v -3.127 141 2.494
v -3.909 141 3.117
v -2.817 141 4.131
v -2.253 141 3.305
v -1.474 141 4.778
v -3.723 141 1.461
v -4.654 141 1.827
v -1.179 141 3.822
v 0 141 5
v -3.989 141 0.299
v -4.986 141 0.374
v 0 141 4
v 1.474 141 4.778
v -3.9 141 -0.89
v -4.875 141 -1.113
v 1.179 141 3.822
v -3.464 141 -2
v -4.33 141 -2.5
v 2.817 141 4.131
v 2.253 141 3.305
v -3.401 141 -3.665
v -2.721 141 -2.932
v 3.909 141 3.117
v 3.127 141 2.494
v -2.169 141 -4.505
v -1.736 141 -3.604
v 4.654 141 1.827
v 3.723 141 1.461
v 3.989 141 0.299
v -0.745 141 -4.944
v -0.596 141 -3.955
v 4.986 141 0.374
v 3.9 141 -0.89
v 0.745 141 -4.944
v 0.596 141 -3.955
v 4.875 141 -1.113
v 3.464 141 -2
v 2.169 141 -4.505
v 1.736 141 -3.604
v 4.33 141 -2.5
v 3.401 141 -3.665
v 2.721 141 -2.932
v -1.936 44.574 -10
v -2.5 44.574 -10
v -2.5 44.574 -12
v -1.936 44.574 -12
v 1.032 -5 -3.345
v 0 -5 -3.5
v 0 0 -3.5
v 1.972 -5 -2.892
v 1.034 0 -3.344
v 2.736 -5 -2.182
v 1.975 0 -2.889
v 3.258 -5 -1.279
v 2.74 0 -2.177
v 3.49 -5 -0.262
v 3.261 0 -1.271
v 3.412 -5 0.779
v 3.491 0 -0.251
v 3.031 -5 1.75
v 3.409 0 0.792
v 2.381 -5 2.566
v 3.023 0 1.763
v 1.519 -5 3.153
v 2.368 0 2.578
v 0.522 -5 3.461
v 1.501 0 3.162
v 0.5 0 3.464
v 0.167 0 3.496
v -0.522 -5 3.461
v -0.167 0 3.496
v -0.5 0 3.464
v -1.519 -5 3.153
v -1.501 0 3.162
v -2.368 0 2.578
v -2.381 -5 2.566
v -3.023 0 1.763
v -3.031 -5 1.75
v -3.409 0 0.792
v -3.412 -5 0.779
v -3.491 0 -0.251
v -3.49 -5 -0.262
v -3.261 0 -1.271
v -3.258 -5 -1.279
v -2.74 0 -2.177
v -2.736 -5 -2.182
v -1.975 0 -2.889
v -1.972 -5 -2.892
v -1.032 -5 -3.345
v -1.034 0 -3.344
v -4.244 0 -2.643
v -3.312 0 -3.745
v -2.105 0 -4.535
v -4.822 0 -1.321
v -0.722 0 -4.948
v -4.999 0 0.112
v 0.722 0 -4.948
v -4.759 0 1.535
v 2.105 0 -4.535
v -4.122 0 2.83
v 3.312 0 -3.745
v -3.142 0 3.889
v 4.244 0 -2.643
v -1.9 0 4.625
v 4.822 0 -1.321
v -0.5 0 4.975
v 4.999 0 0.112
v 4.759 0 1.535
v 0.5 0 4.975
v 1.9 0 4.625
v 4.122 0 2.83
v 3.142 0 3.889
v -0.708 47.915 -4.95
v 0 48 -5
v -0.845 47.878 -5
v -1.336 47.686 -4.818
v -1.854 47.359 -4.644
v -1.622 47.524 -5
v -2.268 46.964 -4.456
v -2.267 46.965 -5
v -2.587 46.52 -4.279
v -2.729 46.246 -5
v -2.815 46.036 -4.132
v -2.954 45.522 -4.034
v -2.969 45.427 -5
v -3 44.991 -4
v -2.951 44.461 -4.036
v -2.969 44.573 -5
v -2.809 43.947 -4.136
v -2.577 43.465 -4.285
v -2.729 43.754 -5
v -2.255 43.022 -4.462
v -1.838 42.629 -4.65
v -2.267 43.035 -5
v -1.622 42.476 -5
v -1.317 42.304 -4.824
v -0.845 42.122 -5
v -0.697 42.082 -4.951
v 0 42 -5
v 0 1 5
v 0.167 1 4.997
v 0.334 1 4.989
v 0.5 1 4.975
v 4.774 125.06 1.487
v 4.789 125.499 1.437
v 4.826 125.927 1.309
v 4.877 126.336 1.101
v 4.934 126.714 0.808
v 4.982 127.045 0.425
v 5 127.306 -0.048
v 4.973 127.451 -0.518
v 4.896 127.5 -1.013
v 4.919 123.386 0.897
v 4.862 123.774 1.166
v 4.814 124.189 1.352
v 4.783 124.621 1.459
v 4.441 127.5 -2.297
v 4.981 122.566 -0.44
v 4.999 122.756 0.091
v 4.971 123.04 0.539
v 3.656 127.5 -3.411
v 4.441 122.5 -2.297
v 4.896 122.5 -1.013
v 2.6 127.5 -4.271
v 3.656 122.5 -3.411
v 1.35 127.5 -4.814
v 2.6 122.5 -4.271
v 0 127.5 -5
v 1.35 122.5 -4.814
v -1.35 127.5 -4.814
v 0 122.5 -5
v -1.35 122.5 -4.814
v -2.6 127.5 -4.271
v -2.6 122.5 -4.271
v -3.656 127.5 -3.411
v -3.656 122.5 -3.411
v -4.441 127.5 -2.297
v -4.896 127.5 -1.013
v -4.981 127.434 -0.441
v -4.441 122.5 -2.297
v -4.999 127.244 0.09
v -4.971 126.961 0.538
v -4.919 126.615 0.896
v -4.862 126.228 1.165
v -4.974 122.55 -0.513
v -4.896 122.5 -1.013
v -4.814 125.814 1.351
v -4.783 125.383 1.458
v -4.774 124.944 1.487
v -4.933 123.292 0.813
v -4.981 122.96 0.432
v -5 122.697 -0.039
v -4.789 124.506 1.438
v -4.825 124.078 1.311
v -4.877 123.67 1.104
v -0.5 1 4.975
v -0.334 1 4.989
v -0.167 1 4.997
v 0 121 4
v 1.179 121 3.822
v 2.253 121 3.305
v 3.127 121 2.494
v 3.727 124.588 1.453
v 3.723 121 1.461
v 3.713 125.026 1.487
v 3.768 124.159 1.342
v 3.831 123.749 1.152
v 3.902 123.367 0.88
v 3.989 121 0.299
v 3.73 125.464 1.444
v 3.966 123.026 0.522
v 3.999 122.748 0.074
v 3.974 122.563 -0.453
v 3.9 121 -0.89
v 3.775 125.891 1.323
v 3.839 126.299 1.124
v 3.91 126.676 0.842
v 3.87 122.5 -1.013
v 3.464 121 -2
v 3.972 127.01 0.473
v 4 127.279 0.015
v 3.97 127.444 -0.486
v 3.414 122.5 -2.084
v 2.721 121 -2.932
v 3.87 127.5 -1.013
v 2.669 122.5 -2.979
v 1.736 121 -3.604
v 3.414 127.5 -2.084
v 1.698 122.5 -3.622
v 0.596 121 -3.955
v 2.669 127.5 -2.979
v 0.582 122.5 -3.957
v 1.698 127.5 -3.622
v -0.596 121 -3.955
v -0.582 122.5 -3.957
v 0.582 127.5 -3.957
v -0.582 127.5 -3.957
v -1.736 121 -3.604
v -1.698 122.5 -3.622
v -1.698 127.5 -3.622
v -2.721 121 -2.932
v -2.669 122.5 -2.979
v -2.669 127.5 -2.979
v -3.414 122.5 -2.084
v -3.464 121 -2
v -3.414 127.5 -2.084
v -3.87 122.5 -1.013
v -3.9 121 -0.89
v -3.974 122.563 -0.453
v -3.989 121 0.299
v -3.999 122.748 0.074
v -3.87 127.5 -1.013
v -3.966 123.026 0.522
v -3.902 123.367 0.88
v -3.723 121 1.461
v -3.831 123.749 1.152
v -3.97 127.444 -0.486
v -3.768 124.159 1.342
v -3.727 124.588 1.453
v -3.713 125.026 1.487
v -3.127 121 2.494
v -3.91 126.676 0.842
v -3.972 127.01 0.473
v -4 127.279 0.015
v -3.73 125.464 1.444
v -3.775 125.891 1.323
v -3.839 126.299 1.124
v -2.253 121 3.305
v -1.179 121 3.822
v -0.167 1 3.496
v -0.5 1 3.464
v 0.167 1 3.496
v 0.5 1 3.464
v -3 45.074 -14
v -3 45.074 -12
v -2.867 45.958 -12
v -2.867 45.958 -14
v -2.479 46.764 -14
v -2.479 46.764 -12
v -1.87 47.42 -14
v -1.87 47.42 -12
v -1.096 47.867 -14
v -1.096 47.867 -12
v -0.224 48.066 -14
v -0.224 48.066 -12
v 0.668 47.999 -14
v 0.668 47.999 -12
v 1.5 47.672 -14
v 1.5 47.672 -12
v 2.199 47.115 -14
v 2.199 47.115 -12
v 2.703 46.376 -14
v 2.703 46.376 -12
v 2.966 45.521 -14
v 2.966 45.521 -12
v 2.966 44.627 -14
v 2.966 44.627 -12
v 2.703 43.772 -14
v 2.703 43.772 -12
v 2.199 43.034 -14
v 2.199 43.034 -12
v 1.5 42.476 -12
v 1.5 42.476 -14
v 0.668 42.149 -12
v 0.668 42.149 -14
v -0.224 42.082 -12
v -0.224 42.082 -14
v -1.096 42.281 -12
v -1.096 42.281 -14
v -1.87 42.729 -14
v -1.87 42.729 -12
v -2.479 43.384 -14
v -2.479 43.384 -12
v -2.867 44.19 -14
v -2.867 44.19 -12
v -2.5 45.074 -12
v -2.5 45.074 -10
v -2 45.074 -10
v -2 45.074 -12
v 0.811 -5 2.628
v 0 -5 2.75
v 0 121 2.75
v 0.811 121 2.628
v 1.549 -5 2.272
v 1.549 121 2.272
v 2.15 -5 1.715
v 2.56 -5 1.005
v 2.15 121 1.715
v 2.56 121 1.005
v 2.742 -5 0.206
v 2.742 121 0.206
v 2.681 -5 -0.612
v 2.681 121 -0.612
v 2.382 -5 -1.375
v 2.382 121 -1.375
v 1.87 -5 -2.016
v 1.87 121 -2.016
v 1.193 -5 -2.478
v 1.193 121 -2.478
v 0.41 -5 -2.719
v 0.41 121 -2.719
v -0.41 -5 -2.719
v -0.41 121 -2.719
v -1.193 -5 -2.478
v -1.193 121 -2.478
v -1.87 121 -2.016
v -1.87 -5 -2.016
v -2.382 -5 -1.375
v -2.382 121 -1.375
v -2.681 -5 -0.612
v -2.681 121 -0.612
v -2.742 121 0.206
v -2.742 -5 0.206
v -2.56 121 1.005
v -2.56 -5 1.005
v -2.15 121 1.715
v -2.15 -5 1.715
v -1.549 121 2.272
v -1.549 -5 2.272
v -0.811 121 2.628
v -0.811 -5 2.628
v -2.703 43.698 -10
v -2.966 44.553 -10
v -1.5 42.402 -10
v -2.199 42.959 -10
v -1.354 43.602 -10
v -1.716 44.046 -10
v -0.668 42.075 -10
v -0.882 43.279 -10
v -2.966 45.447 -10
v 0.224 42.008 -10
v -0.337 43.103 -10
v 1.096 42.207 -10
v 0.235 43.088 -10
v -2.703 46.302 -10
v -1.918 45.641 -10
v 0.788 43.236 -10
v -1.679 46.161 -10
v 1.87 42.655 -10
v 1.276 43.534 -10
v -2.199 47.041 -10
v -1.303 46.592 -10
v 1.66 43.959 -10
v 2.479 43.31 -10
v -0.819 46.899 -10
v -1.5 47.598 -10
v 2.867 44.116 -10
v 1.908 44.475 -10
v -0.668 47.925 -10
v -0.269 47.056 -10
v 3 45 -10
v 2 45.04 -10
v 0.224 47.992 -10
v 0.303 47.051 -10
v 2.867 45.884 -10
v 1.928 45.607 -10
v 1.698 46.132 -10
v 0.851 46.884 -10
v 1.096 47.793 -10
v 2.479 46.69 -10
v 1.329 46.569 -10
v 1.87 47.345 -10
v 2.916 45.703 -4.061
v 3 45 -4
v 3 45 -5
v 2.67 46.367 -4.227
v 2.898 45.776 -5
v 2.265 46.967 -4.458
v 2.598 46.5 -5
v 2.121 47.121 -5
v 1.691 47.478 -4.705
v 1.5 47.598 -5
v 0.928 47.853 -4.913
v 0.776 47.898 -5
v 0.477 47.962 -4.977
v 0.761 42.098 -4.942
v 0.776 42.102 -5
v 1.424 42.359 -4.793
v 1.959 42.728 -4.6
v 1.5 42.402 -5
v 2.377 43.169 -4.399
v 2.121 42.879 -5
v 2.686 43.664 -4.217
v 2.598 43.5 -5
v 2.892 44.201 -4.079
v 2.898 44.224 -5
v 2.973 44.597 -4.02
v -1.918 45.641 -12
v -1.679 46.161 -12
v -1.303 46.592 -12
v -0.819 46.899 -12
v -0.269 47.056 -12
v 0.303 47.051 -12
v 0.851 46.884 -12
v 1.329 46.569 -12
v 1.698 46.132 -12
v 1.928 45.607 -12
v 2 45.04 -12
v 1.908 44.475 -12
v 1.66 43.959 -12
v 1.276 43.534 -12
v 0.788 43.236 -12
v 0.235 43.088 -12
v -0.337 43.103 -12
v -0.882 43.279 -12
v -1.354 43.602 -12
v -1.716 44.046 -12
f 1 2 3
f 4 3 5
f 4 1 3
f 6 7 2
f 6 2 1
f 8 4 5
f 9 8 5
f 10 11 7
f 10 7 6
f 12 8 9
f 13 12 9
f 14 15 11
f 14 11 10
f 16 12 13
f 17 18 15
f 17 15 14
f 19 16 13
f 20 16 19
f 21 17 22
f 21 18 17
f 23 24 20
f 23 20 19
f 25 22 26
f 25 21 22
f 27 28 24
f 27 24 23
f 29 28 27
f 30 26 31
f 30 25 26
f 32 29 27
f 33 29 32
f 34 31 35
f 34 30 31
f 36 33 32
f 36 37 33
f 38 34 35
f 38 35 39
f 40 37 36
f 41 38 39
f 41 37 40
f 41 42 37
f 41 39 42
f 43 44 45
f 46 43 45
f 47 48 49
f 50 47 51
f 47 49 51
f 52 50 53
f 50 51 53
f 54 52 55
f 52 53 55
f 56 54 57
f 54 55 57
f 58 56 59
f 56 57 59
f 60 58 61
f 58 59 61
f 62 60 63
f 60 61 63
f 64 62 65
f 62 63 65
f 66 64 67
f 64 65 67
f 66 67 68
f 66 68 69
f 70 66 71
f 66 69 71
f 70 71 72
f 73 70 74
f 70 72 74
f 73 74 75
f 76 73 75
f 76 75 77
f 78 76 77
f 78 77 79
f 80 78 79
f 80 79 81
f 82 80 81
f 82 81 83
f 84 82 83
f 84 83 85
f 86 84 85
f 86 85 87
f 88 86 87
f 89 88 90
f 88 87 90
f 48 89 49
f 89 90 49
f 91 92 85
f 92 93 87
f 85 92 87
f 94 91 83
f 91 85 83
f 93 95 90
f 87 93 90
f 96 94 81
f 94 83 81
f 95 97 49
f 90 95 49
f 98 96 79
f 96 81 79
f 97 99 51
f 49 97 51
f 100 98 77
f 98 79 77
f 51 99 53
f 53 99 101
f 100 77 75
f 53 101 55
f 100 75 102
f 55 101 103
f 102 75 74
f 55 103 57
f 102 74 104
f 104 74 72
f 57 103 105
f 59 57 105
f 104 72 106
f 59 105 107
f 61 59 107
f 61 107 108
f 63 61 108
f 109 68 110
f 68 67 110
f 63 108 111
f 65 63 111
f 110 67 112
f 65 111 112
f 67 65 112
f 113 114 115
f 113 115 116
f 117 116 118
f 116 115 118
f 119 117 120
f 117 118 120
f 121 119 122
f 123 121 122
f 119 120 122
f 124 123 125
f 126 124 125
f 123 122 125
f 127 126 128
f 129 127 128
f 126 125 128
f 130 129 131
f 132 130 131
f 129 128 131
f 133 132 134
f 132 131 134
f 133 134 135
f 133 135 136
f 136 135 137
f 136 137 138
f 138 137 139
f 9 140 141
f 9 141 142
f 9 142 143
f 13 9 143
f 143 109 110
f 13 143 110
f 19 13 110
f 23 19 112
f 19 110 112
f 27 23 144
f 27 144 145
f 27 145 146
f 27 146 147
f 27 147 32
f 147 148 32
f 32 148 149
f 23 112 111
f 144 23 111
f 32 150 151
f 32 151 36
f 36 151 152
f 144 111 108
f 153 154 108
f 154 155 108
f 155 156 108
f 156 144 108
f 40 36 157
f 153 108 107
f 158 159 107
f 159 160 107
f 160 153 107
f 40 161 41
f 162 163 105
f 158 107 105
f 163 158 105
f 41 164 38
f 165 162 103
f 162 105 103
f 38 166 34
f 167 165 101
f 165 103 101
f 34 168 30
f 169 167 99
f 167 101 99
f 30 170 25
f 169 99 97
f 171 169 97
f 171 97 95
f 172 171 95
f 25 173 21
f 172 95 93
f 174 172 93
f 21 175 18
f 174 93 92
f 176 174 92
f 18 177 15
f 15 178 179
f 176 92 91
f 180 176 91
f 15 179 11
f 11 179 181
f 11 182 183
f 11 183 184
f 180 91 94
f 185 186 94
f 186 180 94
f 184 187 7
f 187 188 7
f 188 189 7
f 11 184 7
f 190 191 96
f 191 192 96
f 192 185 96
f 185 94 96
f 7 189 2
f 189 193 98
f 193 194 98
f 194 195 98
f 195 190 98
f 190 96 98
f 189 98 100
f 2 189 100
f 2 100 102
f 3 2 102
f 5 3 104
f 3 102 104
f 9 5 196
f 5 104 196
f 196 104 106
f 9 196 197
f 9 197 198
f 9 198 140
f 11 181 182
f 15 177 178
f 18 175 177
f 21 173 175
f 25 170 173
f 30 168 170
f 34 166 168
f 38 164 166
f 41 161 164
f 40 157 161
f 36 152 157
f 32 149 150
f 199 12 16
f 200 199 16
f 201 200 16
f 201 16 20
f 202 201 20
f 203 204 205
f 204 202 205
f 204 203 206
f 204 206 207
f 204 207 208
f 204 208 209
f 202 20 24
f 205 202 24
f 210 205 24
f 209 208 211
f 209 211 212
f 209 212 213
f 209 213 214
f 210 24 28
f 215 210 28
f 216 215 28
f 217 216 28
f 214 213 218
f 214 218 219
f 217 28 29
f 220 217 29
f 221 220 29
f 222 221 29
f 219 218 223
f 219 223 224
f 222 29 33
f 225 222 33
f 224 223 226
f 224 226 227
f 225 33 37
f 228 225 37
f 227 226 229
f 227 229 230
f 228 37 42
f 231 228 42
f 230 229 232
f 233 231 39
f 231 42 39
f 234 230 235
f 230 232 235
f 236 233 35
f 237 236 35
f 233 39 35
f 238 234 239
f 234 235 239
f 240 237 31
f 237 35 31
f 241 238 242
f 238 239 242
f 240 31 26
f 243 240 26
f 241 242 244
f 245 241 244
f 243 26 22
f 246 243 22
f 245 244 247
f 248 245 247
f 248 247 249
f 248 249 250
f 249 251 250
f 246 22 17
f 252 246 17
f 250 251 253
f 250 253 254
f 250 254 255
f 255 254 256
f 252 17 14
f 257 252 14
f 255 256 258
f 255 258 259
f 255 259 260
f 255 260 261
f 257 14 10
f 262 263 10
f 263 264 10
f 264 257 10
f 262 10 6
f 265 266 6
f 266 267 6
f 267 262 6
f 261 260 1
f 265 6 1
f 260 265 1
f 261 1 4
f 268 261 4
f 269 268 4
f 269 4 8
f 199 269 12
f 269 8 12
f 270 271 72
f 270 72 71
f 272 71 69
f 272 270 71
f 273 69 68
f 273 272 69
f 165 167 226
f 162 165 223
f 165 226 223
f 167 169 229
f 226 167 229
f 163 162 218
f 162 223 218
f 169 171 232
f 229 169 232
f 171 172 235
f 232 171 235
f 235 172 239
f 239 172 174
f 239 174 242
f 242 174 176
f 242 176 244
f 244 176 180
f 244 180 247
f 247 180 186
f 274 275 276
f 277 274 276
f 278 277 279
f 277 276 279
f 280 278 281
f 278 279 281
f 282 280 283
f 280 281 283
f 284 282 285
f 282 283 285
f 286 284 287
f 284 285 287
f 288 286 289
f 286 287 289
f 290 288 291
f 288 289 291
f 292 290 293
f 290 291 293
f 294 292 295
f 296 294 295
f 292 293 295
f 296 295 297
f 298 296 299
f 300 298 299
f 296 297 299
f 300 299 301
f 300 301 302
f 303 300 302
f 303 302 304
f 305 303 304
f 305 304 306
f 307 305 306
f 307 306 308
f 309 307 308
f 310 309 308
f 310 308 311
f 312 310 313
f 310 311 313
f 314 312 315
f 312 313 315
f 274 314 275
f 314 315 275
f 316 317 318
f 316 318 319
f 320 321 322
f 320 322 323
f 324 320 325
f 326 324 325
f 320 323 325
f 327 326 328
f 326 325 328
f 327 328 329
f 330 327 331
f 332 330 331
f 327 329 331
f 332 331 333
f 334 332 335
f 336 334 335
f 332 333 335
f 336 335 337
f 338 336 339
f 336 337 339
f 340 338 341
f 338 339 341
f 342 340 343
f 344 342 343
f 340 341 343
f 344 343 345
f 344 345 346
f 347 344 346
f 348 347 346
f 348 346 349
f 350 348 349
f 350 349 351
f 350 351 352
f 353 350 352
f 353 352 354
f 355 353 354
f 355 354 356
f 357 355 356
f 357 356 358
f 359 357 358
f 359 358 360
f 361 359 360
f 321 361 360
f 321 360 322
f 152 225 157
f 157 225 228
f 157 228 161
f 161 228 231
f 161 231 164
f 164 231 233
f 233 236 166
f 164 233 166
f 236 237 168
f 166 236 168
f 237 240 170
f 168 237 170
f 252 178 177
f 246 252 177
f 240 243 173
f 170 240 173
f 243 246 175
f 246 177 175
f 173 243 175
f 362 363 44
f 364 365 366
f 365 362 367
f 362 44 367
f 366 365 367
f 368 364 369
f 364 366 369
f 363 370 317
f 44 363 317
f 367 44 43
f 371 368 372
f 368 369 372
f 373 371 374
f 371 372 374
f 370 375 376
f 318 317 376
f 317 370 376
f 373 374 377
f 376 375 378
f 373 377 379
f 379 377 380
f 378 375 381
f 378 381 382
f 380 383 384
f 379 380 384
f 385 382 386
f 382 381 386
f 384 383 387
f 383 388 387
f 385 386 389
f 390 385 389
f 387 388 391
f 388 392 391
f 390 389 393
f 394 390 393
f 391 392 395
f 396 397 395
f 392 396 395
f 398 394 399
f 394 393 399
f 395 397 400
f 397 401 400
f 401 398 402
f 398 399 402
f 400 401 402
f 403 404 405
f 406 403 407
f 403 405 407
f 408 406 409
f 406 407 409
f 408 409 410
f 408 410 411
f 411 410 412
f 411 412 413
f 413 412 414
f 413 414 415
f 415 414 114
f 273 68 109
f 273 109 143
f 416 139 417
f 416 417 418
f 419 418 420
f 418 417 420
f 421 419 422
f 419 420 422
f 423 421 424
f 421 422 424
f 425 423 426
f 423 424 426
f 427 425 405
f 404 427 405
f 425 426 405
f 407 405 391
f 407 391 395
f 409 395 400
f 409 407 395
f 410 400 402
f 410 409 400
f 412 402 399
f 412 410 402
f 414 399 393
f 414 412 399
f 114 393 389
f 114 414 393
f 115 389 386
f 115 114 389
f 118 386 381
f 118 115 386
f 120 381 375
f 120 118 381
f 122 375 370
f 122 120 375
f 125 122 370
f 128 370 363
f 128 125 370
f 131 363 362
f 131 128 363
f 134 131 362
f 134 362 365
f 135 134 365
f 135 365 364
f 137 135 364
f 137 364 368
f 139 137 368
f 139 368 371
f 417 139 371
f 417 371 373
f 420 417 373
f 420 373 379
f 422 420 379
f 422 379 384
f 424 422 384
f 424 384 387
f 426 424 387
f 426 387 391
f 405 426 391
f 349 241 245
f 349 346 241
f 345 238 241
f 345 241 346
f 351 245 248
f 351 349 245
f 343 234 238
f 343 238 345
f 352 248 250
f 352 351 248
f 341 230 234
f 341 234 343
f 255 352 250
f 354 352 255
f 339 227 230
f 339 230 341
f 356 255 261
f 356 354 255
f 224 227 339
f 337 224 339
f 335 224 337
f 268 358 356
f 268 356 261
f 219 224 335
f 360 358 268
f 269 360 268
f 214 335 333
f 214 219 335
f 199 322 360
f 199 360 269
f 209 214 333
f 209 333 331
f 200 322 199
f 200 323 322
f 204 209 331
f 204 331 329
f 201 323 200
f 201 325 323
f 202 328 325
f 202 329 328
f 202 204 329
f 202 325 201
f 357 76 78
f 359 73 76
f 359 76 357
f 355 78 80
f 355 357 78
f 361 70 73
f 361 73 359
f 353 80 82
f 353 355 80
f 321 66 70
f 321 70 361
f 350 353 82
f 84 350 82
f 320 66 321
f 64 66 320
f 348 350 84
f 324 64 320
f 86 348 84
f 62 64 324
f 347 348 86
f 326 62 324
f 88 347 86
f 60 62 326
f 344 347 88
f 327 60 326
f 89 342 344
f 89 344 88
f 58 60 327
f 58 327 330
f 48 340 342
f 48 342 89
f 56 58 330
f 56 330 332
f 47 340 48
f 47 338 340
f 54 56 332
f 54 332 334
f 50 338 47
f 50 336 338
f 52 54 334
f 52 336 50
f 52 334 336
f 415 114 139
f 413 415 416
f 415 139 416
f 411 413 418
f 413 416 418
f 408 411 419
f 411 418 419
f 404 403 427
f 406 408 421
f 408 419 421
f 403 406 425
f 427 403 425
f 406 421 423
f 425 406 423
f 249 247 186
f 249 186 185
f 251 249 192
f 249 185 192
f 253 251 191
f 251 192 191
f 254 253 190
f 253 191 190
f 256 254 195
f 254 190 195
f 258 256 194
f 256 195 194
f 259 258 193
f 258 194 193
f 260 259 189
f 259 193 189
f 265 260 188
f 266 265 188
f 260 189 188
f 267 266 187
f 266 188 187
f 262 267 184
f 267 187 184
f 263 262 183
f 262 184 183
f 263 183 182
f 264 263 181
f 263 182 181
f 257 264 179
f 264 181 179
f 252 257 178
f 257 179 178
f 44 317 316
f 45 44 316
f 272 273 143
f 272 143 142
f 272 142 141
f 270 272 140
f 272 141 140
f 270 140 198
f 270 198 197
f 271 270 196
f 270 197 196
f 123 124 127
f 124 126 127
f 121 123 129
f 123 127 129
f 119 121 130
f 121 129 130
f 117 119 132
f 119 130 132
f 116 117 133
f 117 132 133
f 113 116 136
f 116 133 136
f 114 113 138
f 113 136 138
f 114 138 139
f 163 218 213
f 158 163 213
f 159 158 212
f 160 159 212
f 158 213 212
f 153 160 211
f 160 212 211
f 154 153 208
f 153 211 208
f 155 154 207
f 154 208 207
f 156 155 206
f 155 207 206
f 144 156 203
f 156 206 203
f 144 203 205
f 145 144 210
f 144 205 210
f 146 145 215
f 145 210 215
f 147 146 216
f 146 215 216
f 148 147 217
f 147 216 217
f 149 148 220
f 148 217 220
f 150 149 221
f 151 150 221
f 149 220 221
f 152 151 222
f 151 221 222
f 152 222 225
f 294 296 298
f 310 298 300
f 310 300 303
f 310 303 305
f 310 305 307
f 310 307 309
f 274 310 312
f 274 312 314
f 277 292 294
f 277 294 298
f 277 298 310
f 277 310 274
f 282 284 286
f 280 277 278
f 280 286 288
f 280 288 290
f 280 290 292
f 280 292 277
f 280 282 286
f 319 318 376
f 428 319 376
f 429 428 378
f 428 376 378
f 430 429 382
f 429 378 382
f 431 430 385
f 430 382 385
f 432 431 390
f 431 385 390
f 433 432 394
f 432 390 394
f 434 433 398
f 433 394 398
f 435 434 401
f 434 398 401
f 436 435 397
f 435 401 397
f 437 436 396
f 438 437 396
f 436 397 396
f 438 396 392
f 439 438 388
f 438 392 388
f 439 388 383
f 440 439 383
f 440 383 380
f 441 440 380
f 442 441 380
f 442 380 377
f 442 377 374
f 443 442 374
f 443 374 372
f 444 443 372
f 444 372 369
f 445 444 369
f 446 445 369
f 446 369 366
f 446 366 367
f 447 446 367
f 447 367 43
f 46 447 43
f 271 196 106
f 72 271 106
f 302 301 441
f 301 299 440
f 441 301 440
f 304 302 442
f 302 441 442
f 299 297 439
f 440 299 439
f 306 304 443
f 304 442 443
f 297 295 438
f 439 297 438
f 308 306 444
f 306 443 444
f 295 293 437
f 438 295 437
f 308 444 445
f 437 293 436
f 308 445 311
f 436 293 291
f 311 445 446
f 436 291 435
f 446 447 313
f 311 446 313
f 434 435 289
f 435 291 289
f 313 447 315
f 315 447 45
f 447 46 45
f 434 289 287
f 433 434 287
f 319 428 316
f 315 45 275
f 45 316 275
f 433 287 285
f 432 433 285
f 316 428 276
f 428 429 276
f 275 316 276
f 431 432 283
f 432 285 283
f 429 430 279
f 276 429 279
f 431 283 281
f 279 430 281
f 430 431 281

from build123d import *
from build123d.topology import SkipClean

# Parameters (mm, degrees)
SKETCH1_R                            = 5
BOSS_EXTRUDE1_DEPTH                  = 150
SKETCH4_R                            = 3
BOSS_EXTRUDE2_DEPTH                  = 5
BOSS_EXTRUDE2_DIRECTION_2_REACH      = 152.416
BOSS_EXTRUDE2_DIRECTION_2_END_RADIUS = 5
SKETCH5_R                            = 2
BOSS_EXTRUDE3_DEPTH                  = 2
SKETCH6_R                            = 3
BOSS_EXTRUDE4_DEPTH                  = 2
SKETCH7_R                            = 3.5
BOSS_EXTRUDE5_DEPTH                  = 5
BOSS_EXTRUDE6_START                  = 5
SKETCH8_R                            = 3.5
BOSS_EXTRUDE6_DEPTH                  = 5
SKETCH9_R                            = 2.75
CUT_EXTRUDE1_DEPTH                   = 168
CUT_EXTRUDE4_REACH                   = 158.24
CUT_EXTRUDE4_END_RADIUS              = 3.5
BOSS_EXTRUDE7_START                  = 1
BOSS_EXTRUDE7_DEPTH                  = 1
CUT_EXTRUDE5_DEPTH                   = 18
SKETCH19_R                           = 4
CUT_EXTRUDE6_DEPTH                   = 34
SKETCH20_W                           = 24.40949837
SKETCH20_H                           = 28.25498801
CUT_EXTRUDE7_DEPTH                   = 10
BOSS_EXTRUDE8_REACH                  = 143.892
BOSS_EXTRUDE8_END_RADIUS             = 2
SKETCH22_W                           = 2
SKETCH22_H                           = 0.5


with BuildPart() as part:
    # Sketch1 → Boss-Extrude1 (new body)
    with BuildSketch(Plane(origin=(0, 0, 0), x_dir=(1, 0, 0), z_dir=(0, 1, 0))):
        with Locations(Location((0, 0, 0), (0, 0, 270))):
            Circle(SKETCH1_R)
    extrude(amount=BOSS_EXTRUDE1_DEPTH)

    # Sketch7 → Boss-Extrude5 (add)
    with BuildSketch(Plane.XZ):
        with Locations(Location((0, 0, 0), (0, 0, 270))):
            Circle(SKETCH7_R)
    extrude(amount=BOSS_EXTRUDE5_DEPTH)

    # Sketch8 → Boss-Extrude6 (add)
    with BuildSketch(Plane(origin=(0, 150, 0), x_dir=(1, 0, 0), z_dir=(0, 1, 0)).offset(BOSS_EXTRUDE6_START)):
        with Locations(Location((0, 0, 0), (0, 0, 90))):
            Circle(SKETCH8_R)
    extrude(amount=-BOSS_EXTRUDE6_DEPTH)

    # Sketch9 → Cut-Extrude1 (cut)
    with BuildSketch(Plane(origin=(0, 155, 0), x_dir=(1, 0, 0), z_dir=(0, 1, 0))):
        with Locations(Location((0, 0, 0), (0, 0, 270))):
            Circle(SKETCH9_R)
    extrude(amount=-CUT_EXTRUDE1_DEPTH, mode=Mode.SUBTRACT)

    # Cut-Extrude4: up to this cylinder (the profile starts outside it)
    cut_extrude4_end = Plane(origin=(0, 0.5, 0), z_dir=(0, 1, 0)) * Cylinder(CUT_EXTRUDE4_END_RADIUS, 324.48, mode=Mode.PRIVATE)
    # Sketch14 → Cut-Extrude4 (cut, up to the surface)
    with BuildSketch(Plane.XY.offset(5), mode=Mode.PRIVATE) as cut_extrude4_sk1:
        Polygon((0, 0), (0.5, 0), (0.5, 1), (-0.5, 1), (-0.5, 0), align=None)
    cut_extrude4_tool1 = extrude(cut_extrude4_sk1.sketch, amount=-CUT_EXTRUDE4_REACH, mode=Mode.PRIVATE) - cut_extrude4_end
    add(cut_extrude4_tool1.solids().sort_by_distance((0, 0.5, 5))[0], mode=Mode.SUBTRACT)

    # Sketch16 → Boss-Extrude7 (add)
    with BuildSketch(Plane(origin=(0, 150, 0), x_dir=(1, 0, 0), z_dir=(0, 1, 0)).offset(BOSS_EXTRUDE7_START)):
        with BuildLine():
            Line((0.5, -3.5), (0.5, -4.974937186))
            ThreePointArc((0.5, -4.974937186), (0, -5), (-0.5, -4.974937186))
            Line((-0.5, -4.974937186), (-0.5, -3.5))
            Line((-0.5, -3.5), (-0.5, -3.464101615))
            ThreePointArc((-0.5, -3.464101615), (0, -3.5), (0.5, -3.464101615))
            Line((0.5, -3.464101615), (0.5, -3.5))
        make_face()
    extrude(amount=-BOSS_EXTRUDE7_DEPTH)

    # Sketch18 → Cut-Extrude5 (cut)
    with BuildSketch(Plane(origin=(-5, 0, 0), x_dir=(0, 0, -1), z_dir=(1, 0, 0))):
        with BuildLine():
            Line((1.012531407, 127.5), (8.012531407, 127.5))
            Line((8.012531407, 127.5), (8.012531407, 122.5))
            Line((8.012531407, 122.5), (1.012531407, 122.5))
            ThreePointArc((1.012531407, 122.5), (-1.487468593, 125), (1.012531407, 127.5))
        make_face()
    extrude(amount=CUT_EXTRUDE5_DEPTH, mode=Mode.SUBTRACT)

    # Sketch19 → Cut-Extrude6 (cut)
    with BuildSketch(Plane(origin=(0, 155, 0), x_dir=(1, 0, 0), z_dir=(0, 1, 0))):
        with Locations(Location((0, 0, 0), (0, 0, 270))):
            Circle(SKETCH19_R)
    extrude(amount=-CUT_EXTRUDE6_DEPTH, mode=Mode.SUBTRACT)

    # Sketch20 → Cut-Extrude7 (cut)
    with BuildSketch(Plane(origin=(0, 151, 0), x_dir=(1, 0, 0), z_dir=(0, 1, 0))):
        Rectangle(SKETCH20_W, SKETCH20_H)
    extrude(amount=-CUT_EXTRUDE7_DEPTH, mode=Mode.SUBTRACT)


with BuildPart() as body_2:
    # Sketch4 → Boss-Extrude2 (new body)
    with BuildSketch(Plane.XY.offset(-5)):
        with Locations((0, 45)):
            Circle(SKETCH4_R)
    extrude(amount=-BOSS_EXTRUDE2_DEPTH)

    # Boss-Extrude2 direction 2: up to this cylinder (the profile starts outside it)
    with SkipClean():  # the faces are left unmerged after this step: merging them gives an invalid solid
        boss_extrude2_direction_2_end = Plane(origin=(0, 45, 0), z_dir=(0, -1, 0)) * Cylinder(BOSS_EXTRUDE2_DIRECTION_2_END_RADIUS, 315.832, mode=Mode.PRIVATE)
        # Sketch4 → Boss-Extrude2 direction 2 (add, up to the surface)
        with BuildSketch(Plane.XY.offset(-5), mode=Mode.PRIVATE) as boss_extrude2_direction_2_sk1:
            with Locations((0, 45)):
                Circle(SKETCH4_R)
        boss_extrude2_direction_2_tool1 = extrude(boss_extrude2_direction_2_sk1.sketch, amount=BOSS_EXTRUDE2_DIRECTION_2_REACH, mode=Mode.PRIVATE) - boss_extrude2_direction_2_end
        add(boss_extrude2_direction_2_tool1.solids().sort_by_distance((0, 45, -5))[0])
        add(boss_extrude2_direction_2_tool1.solids().sort_by_distance((0, 45, -5))[1])

    # Sketch5 → Boss-Extrude3 (add)
    with SkipClean():  # the faces are left unmerged after this step: merging them gives an invalid solid
        with BuildSketch(Plane(origin=(0, 0, -10), x_dir=(-1, 0, 0), z_dir=(0, 0, -1))):
            with Locations((0, 45.074078642)):
                Circle(SKETCH5_R)
        extrude(amount=BOSS_EXTRUDE3_DEPTH)

    # Sketch6 → Boss-Extrude4 (add)
    with SkipClean():  # the faces are left unmerged after this step: merging them gives an invalid solid
        with BuildSketch(Plane(origin=(0, 0, -12), x_dir=(-1, 0, 0), z_dir=(0, 0, -1))):
            with Locations((0, 45.074078642)):
                Circle(SKETCH6_R)
        extrude(amount=BOSS_EXTRUDE4_DEPTH)

    # Boss-Extrude8: up to this cylinder (the profile starts outside it)
    with SkipClean():  # the faces are left unmerged after this step: merging them gives an invalid solid
        boss_extrude8_end = Plane(origin=(0, 45.074078642, -11), z_dir=(0, 0, 1)) * Cylinder(BOSS_EXTRUDE8_END_RADIUS, 292.784, mode=Mode.PRIVATE)
        # Sketch22 → Boss-Extrude8 (add, up to the surface)
        with BuildSketch(Plane(origin=(-2.5, 0, 0), x_dir=(0, 0, -1), z_dir=(1, 0, 0)), mode=Mode.PRIVATE) as boss_extrude8_sk1:
            with Locations((11, 44.824078642)):
                Rectangle(SKETCH22_W, SKETCH22_H)
        boss_extrude8_tool1 = extrude(boss_extrude8_sk1.sketch, amount=BOSS_EXTRUDE8_REACH, mode=Mode.PRIVATE) - boss_extrude8_end
        add(boss_extrude8_tool1.solids().sort_by_distance((-2.5, 44.824079, -11))[0])


solid = Compound([part.part, body_2.part])
